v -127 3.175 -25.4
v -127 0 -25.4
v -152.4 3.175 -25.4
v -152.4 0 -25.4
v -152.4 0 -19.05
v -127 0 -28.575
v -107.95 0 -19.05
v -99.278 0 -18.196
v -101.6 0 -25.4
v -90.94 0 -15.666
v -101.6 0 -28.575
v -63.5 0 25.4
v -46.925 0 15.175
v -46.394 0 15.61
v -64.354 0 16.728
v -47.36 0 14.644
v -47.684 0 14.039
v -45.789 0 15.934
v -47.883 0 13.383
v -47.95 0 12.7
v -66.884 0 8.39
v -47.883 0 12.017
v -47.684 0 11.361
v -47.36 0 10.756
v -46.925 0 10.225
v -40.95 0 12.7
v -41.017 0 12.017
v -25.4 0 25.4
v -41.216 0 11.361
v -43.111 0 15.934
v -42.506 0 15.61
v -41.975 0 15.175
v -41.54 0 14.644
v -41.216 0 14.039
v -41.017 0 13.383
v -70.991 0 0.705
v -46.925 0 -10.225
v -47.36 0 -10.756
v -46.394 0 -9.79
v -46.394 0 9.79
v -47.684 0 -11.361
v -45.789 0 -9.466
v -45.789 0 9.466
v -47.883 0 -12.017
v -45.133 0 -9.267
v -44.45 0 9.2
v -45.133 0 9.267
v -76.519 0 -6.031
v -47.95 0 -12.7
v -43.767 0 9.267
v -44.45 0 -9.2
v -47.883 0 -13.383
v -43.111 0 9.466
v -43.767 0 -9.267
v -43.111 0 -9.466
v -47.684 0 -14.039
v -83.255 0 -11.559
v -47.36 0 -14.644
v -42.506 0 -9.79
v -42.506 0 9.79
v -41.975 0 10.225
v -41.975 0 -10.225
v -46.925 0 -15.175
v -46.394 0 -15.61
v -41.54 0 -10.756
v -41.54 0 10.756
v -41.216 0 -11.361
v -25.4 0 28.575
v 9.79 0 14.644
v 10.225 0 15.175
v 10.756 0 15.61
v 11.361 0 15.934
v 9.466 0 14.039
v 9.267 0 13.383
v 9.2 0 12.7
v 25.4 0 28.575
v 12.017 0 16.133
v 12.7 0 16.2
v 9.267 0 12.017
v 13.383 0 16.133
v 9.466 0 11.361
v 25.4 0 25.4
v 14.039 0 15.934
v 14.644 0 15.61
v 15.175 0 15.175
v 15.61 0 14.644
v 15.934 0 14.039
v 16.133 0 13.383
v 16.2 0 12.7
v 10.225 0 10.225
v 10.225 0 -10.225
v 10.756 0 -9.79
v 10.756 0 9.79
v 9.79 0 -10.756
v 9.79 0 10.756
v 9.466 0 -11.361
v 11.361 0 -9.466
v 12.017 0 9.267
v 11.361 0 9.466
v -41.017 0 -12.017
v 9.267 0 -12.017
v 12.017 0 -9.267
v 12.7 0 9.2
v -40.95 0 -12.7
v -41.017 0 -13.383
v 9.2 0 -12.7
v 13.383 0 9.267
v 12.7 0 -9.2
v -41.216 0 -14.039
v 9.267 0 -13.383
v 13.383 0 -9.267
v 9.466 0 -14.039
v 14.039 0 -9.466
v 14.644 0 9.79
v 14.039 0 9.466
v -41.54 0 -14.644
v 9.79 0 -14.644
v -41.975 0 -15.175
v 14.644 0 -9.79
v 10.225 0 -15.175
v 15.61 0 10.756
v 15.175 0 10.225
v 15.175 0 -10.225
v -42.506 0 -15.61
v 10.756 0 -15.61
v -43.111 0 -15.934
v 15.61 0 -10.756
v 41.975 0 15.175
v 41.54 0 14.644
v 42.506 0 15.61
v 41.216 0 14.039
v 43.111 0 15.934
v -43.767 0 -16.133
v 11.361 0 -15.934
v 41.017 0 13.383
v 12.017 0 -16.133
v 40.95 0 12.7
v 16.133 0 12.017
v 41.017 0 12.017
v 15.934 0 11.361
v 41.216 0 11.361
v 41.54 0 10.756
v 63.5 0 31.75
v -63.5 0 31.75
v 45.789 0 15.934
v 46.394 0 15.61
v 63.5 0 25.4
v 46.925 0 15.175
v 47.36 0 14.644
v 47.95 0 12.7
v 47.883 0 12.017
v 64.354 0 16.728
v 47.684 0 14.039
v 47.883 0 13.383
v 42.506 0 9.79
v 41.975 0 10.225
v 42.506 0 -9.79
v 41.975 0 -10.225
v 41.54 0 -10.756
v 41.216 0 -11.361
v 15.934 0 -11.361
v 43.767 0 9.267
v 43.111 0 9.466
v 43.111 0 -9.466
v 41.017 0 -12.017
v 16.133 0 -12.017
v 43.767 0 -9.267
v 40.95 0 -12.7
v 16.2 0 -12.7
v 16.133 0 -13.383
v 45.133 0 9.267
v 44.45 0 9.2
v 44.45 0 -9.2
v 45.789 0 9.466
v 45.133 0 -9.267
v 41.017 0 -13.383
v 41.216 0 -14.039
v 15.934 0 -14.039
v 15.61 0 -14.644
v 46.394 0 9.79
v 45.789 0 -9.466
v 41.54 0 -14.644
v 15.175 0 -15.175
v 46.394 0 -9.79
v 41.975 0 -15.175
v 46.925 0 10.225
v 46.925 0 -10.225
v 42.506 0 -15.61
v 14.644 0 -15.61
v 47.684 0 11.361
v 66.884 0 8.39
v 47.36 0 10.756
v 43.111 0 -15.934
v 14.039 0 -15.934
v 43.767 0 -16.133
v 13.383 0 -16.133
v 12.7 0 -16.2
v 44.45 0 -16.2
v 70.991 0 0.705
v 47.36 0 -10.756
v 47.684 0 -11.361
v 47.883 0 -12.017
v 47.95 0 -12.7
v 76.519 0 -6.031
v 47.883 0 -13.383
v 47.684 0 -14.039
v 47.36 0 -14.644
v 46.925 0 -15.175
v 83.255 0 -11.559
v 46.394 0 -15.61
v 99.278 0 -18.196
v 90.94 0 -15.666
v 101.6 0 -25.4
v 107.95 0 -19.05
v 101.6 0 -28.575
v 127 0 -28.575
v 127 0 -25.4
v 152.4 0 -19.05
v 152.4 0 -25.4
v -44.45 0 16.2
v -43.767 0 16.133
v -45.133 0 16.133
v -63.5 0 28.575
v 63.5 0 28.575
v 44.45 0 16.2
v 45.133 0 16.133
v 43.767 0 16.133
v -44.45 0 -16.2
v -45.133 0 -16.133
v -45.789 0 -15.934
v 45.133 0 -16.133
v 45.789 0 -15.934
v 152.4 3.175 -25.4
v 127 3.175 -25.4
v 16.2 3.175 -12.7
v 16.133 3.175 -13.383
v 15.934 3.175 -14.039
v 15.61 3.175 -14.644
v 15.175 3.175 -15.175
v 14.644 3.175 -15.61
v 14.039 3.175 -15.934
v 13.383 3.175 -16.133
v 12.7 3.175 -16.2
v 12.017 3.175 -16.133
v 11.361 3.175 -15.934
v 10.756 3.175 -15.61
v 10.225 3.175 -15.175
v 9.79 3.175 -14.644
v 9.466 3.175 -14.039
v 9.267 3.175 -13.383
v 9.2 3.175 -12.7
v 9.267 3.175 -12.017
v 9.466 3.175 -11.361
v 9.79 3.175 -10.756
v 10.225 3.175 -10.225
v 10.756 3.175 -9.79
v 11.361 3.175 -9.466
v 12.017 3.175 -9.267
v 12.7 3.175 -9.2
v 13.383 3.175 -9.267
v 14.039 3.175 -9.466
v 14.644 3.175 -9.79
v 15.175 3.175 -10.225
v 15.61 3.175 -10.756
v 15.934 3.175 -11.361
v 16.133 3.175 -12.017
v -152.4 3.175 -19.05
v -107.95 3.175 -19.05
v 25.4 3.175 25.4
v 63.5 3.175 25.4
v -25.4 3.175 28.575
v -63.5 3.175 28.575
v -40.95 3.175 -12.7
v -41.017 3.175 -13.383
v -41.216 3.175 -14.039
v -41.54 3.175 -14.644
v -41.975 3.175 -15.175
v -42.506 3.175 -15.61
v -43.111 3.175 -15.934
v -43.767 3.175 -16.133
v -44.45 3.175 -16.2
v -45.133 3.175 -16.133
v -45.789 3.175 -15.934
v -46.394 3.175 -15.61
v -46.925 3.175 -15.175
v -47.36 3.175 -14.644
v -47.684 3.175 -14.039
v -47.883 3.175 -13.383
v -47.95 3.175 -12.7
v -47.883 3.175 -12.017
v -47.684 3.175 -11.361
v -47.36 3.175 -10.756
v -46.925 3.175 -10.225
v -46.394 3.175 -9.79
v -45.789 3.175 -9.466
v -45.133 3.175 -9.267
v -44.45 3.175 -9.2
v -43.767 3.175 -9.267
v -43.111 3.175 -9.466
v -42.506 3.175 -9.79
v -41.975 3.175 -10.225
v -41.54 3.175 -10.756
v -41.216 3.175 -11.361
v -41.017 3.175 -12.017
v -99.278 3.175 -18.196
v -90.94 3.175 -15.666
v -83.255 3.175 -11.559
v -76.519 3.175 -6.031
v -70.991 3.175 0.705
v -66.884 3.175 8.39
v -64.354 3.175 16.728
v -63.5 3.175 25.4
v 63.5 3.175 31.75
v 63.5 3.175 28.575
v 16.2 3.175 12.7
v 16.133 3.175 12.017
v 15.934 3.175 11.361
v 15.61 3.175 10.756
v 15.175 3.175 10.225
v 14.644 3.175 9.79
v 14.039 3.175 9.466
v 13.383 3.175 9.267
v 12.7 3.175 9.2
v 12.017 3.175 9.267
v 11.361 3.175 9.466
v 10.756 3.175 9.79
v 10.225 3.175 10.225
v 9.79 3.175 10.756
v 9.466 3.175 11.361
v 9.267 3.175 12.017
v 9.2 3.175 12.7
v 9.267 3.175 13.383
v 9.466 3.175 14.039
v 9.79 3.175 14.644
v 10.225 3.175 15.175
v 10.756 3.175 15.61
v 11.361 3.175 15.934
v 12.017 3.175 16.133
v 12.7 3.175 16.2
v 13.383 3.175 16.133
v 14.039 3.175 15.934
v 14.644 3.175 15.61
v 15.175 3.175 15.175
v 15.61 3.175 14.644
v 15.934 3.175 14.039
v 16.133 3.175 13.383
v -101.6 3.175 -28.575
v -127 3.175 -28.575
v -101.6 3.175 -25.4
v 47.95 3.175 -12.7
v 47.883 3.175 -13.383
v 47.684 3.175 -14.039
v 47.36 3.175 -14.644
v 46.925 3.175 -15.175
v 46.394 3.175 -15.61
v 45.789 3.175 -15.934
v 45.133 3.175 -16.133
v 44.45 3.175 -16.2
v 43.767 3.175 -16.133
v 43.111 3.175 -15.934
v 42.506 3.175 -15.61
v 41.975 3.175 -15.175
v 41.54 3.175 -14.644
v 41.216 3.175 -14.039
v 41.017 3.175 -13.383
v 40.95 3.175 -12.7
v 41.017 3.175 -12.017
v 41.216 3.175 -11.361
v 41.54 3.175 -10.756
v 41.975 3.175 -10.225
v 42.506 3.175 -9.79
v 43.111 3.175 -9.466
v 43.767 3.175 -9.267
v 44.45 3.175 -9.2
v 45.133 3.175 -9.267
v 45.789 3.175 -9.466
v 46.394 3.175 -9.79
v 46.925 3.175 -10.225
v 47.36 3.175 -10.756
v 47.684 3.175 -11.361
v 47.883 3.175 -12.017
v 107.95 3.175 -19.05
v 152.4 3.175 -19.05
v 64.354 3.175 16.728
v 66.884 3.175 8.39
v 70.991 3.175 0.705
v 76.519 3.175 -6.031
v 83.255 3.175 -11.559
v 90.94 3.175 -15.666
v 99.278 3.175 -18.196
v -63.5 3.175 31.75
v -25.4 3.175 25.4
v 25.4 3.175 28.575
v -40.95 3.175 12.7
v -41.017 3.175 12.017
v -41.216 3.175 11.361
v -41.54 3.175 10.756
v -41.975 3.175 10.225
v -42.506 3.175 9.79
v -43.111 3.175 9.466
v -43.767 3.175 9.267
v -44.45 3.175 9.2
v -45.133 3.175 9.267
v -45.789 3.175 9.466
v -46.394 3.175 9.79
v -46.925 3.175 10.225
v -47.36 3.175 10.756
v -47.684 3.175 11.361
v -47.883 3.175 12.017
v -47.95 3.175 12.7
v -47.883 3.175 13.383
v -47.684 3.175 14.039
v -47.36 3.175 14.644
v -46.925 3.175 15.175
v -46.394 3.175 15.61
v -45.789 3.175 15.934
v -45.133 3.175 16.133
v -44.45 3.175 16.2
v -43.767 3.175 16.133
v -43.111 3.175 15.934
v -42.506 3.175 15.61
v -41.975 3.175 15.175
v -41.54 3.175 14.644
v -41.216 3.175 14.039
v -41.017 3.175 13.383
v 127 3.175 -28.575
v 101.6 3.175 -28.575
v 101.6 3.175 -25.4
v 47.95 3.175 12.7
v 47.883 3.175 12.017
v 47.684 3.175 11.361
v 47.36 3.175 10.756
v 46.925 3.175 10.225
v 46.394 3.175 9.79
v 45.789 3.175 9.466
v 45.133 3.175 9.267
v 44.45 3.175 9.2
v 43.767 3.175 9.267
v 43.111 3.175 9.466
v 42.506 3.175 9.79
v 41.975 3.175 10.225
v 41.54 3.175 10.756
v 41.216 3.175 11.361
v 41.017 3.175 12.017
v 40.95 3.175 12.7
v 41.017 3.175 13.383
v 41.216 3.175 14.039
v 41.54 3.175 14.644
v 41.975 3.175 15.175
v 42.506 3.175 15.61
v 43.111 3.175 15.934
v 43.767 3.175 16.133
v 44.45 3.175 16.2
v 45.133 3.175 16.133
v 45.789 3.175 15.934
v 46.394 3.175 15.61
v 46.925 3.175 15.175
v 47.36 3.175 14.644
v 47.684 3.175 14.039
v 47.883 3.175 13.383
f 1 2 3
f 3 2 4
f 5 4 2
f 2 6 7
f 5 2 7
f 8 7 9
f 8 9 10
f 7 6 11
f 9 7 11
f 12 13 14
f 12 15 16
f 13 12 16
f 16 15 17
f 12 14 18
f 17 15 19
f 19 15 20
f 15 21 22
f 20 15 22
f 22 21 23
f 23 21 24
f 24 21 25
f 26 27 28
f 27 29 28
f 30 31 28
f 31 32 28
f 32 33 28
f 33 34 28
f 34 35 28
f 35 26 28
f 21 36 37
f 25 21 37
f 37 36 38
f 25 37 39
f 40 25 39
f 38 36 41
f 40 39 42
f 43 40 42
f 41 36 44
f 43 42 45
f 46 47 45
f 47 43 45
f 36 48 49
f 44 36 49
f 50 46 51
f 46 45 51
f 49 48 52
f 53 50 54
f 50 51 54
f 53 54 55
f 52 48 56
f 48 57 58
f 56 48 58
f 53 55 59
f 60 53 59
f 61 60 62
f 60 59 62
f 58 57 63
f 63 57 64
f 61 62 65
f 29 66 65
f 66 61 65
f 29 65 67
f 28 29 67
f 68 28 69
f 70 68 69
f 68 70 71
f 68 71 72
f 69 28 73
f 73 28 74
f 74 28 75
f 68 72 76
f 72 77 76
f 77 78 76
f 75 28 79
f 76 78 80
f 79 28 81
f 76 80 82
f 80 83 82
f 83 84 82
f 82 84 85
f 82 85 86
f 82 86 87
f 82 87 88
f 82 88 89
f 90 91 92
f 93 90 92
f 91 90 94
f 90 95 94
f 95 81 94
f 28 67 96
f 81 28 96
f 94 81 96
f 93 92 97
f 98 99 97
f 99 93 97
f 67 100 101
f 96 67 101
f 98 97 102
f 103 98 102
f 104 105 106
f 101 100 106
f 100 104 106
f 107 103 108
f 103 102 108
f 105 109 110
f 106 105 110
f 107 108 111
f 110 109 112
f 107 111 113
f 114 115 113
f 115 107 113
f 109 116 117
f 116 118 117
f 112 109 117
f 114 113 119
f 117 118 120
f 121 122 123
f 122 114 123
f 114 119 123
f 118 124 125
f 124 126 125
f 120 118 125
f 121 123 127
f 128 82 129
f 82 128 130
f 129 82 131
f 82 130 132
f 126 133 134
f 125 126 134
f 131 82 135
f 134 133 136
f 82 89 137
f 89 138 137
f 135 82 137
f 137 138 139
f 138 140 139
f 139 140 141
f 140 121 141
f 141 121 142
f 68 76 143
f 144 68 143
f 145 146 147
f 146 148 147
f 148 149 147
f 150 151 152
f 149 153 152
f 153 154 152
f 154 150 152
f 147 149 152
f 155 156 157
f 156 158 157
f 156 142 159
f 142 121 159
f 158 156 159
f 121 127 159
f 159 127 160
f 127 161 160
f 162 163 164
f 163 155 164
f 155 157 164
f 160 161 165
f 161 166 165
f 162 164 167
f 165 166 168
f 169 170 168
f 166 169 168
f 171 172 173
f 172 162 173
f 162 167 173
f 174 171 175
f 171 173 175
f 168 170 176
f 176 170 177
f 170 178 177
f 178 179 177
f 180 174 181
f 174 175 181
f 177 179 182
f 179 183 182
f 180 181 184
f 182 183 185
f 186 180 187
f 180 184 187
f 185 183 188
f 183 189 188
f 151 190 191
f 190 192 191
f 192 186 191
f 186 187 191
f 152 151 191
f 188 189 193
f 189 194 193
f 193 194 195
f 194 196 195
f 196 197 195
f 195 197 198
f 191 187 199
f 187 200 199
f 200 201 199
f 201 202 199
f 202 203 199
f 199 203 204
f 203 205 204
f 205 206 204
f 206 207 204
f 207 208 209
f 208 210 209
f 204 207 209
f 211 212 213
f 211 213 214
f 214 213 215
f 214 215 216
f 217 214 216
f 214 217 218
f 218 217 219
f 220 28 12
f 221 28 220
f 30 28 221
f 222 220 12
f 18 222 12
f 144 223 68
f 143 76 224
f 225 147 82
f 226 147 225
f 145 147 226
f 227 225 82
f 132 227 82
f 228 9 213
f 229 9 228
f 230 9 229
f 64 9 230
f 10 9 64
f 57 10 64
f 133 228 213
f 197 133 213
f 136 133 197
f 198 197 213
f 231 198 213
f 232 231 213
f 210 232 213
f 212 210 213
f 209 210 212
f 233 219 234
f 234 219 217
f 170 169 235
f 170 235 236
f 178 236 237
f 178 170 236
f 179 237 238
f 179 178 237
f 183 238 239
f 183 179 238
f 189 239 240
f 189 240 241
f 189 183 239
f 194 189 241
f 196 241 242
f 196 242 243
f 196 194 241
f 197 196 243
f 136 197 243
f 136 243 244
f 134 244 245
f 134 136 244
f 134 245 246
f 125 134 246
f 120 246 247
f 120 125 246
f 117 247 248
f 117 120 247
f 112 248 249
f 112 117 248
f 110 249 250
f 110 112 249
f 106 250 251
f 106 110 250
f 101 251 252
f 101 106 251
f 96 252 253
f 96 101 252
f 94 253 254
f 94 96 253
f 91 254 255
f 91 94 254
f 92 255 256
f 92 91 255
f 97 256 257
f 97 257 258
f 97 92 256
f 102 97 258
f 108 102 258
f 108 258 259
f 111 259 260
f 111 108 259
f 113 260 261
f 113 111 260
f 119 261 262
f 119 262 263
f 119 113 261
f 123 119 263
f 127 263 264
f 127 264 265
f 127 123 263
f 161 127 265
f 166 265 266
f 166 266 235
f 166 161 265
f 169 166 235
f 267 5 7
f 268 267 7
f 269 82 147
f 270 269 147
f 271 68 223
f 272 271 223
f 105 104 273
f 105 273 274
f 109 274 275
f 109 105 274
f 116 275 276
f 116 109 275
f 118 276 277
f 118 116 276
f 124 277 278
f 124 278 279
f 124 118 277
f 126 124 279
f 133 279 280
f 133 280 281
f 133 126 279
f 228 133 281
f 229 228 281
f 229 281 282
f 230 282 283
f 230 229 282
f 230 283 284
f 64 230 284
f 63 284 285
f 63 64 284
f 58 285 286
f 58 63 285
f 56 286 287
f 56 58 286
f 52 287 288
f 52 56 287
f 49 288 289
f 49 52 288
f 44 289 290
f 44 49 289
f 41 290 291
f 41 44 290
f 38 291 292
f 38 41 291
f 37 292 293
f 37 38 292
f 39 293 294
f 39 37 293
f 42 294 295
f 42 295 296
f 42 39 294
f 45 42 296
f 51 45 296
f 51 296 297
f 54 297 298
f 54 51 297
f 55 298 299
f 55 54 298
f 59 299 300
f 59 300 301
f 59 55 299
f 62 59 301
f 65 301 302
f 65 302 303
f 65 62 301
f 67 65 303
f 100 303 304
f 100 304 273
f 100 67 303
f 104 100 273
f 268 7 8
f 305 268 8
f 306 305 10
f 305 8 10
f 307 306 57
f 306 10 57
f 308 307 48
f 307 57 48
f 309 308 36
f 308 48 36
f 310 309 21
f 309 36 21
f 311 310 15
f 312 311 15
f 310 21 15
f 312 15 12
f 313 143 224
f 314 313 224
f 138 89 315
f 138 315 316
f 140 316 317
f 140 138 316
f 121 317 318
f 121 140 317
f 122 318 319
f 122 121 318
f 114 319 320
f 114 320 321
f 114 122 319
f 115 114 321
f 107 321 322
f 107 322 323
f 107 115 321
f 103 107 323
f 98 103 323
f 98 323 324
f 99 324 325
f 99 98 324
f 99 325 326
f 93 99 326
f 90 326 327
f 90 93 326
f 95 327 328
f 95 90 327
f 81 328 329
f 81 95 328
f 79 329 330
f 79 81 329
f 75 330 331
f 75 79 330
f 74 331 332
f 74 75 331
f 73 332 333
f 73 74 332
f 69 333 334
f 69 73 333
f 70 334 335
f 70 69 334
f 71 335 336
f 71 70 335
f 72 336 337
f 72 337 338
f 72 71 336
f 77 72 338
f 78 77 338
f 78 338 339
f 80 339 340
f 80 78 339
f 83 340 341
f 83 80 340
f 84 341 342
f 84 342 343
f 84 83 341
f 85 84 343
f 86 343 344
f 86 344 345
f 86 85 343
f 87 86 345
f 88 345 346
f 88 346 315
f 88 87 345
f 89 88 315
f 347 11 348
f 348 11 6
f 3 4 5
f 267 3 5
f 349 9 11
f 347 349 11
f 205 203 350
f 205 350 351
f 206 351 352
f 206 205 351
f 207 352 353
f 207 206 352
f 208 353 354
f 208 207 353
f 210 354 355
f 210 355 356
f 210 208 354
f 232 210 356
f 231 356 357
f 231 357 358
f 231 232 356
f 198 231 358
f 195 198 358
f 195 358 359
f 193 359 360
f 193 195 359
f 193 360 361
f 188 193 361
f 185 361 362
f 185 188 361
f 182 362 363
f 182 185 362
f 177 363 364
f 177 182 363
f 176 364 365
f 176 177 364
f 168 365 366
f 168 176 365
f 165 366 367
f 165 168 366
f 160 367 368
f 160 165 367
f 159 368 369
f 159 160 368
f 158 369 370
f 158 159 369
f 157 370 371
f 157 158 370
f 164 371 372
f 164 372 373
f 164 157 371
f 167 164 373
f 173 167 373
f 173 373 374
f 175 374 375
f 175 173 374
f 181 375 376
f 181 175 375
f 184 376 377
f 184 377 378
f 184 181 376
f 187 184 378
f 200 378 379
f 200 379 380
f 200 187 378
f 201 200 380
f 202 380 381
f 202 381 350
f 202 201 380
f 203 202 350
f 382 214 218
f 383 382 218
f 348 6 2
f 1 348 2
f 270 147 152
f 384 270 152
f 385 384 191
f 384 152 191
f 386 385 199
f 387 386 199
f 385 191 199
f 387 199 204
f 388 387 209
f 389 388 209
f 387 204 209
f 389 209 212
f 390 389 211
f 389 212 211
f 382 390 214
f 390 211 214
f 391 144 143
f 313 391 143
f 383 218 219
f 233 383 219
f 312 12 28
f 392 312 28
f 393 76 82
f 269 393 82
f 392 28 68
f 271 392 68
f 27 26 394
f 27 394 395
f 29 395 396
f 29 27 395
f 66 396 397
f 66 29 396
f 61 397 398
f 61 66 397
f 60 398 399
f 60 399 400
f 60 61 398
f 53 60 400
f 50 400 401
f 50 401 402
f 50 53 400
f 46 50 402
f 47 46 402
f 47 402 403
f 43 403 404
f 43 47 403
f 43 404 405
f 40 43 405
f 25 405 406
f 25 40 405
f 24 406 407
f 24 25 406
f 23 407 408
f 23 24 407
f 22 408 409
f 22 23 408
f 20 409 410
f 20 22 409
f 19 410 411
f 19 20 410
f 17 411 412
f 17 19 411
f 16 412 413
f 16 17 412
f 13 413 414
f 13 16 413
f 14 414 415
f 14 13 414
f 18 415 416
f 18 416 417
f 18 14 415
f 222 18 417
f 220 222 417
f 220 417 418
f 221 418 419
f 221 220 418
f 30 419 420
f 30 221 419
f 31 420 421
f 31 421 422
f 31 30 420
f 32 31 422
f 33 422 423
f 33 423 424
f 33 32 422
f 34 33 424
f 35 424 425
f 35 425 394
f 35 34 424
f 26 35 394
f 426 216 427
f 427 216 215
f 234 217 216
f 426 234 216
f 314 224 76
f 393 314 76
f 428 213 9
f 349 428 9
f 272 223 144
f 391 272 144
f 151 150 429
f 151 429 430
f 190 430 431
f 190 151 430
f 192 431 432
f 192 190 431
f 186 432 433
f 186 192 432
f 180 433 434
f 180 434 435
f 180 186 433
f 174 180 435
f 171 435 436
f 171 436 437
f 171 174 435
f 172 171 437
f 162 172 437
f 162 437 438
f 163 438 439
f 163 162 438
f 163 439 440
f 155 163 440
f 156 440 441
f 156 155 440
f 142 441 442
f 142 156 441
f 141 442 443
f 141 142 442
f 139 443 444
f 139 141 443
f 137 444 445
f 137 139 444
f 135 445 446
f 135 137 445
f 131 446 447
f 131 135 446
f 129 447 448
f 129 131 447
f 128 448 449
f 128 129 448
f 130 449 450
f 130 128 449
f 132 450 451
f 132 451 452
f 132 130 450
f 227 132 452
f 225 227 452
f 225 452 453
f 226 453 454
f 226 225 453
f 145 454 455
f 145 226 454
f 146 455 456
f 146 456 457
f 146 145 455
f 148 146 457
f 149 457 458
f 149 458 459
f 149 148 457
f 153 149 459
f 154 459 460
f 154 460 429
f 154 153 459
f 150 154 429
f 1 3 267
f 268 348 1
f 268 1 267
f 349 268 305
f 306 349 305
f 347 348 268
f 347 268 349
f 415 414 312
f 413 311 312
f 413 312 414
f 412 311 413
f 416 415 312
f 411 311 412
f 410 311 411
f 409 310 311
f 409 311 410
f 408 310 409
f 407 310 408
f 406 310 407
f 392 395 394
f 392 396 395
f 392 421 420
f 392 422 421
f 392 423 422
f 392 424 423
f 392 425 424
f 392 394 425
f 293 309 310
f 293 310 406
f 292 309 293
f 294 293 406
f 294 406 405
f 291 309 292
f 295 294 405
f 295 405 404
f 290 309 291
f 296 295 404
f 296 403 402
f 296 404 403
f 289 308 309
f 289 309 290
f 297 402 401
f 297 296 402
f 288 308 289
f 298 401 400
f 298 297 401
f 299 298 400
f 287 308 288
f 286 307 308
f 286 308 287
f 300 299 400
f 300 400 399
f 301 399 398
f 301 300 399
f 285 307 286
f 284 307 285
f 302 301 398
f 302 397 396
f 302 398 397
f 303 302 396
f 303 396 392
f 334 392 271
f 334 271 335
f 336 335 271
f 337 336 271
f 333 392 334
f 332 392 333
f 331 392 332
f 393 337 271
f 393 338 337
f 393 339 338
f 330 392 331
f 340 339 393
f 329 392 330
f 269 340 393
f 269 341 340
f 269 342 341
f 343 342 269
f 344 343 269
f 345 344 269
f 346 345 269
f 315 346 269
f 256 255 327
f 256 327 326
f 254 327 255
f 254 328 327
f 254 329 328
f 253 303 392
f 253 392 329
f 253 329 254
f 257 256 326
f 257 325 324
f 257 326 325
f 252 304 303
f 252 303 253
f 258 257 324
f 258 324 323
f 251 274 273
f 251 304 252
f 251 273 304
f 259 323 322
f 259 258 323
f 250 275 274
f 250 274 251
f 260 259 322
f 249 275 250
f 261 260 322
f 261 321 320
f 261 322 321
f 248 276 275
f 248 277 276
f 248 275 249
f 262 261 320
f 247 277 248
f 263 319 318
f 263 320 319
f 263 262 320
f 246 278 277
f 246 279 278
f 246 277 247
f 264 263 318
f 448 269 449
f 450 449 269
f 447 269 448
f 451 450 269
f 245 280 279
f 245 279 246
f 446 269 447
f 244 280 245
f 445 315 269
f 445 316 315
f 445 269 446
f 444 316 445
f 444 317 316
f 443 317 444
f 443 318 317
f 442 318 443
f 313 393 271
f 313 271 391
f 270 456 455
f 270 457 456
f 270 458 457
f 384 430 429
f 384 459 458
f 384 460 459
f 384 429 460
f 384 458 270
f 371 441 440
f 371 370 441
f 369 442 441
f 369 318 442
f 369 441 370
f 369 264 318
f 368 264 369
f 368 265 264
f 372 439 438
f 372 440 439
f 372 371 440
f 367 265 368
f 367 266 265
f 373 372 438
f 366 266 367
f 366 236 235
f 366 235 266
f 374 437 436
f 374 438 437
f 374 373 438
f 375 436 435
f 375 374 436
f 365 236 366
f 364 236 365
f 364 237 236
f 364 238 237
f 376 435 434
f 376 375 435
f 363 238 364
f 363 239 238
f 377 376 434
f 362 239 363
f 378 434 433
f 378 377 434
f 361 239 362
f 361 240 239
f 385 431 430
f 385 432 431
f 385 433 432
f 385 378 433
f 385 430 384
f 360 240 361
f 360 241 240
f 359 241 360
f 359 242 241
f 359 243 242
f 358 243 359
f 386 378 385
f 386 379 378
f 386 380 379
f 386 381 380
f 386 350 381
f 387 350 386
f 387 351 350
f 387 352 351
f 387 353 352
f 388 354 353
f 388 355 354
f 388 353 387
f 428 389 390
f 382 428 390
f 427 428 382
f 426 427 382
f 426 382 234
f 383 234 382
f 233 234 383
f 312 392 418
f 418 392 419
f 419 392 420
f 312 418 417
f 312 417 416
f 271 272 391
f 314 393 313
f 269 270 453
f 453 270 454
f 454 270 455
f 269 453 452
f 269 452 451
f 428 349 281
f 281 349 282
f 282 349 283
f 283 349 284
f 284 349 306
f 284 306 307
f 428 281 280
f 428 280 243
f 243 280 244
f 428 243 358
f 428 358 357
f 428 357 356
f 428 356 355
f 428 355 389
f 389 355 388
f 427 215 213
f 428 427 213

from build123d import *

# Parameters (mm, degrees)
SKETCH1_R           = 3.5
BOSS_EXTRUDE1_DEPTH = 3.175


with BuildPart() as part:
    # Sketch1 → Boss-Extrude1 (new body)
    with BuildSketch(Plane(origin=(0, 0, 0), x_dir=(1, 0, 0), z_dir=(0, 1, 0))):
        with BuildLine():
            Line((-152.4, 19.05), (-107.95, 19.05))
            ThreePointArc((-107.95, 19.05), (-76.519103576, 6.030896424), (-63.5, -25.4))
            Line((-63.5, -25.4), (-25.4, -25.4))
            Line((-25.4, -25.4), (-25.4, -28.575))
            Line((-25.4, -28.575), (-63.5, -28.575))
            Line((-63.5, -28.575), (-63.5, -31.75))
            Line((-63.5, -31.75), (63.5, -31.75))
            Line((63.5, -31.75), (63.5, -28.575))
            Line((63.5, -28.575), (25.4, -28.575))
            Line((25.4, -28.575), (25.4, -25.4))
            Line((25.4, -25.4), (63.5, -25.4))
            ThreePointArc((63.5, -25.4), (76.519103576, 6.030896424), (107.95, 19.05))
            Line((107.95, 19.05), (152.4, 19.05))
            Line((152.4, 19.05), (152.4, 25.4))
            Line((152.4, 25.4), (127, 25.4))
            Line((127, 25.4), (127, 28.575))
            Line((127, 28.575), (101.6, 28.575))
            Line((101.6, 28.575), (101.6, 25.4))
            Line((101.6, 25.4), (-101.6, 25.4))
            Line((-101.6, 25.4), (-101.6, 28.575))
            Line((-101.6, 28.575), (-127, 28.575))
            Line((-127, 28.575), (-127, 25.4))
            Line((-127, 25.4), (-152.4, 25.4))
            Line((-152.4, 25.4), (-152.4, 19.05))
        make_face()
        with Locations((-44.45, -12.7)):
            Circle(SKETCH1_R, mode=Mode.SUBTRACT)
        with Locations((12.7, -12.7)):
            Circle(SKETCH1_R, mode=Mode.SUBTRACT)
        with Locations((44.45, -12.7)):
            Circle(SKETCH1_R, mode=Mode.SUBTRACT)
        with Locations((-44.45, 12.7)):
            Circle(SKETCH1_R, mode=Mode.SUBTRACT)
        with Locations((12.7, 12.7)):
            Circle(SKETCH1_R, mode=Mode.SUBTRACT)
        with Locations((44.45, 12.7)):
            Circle(SKETCH1_R, mode=Mode.SUBTRACT)
    extrude(amount=BOSS_EXTRUDE1_DEPTH)


solid = part.part
